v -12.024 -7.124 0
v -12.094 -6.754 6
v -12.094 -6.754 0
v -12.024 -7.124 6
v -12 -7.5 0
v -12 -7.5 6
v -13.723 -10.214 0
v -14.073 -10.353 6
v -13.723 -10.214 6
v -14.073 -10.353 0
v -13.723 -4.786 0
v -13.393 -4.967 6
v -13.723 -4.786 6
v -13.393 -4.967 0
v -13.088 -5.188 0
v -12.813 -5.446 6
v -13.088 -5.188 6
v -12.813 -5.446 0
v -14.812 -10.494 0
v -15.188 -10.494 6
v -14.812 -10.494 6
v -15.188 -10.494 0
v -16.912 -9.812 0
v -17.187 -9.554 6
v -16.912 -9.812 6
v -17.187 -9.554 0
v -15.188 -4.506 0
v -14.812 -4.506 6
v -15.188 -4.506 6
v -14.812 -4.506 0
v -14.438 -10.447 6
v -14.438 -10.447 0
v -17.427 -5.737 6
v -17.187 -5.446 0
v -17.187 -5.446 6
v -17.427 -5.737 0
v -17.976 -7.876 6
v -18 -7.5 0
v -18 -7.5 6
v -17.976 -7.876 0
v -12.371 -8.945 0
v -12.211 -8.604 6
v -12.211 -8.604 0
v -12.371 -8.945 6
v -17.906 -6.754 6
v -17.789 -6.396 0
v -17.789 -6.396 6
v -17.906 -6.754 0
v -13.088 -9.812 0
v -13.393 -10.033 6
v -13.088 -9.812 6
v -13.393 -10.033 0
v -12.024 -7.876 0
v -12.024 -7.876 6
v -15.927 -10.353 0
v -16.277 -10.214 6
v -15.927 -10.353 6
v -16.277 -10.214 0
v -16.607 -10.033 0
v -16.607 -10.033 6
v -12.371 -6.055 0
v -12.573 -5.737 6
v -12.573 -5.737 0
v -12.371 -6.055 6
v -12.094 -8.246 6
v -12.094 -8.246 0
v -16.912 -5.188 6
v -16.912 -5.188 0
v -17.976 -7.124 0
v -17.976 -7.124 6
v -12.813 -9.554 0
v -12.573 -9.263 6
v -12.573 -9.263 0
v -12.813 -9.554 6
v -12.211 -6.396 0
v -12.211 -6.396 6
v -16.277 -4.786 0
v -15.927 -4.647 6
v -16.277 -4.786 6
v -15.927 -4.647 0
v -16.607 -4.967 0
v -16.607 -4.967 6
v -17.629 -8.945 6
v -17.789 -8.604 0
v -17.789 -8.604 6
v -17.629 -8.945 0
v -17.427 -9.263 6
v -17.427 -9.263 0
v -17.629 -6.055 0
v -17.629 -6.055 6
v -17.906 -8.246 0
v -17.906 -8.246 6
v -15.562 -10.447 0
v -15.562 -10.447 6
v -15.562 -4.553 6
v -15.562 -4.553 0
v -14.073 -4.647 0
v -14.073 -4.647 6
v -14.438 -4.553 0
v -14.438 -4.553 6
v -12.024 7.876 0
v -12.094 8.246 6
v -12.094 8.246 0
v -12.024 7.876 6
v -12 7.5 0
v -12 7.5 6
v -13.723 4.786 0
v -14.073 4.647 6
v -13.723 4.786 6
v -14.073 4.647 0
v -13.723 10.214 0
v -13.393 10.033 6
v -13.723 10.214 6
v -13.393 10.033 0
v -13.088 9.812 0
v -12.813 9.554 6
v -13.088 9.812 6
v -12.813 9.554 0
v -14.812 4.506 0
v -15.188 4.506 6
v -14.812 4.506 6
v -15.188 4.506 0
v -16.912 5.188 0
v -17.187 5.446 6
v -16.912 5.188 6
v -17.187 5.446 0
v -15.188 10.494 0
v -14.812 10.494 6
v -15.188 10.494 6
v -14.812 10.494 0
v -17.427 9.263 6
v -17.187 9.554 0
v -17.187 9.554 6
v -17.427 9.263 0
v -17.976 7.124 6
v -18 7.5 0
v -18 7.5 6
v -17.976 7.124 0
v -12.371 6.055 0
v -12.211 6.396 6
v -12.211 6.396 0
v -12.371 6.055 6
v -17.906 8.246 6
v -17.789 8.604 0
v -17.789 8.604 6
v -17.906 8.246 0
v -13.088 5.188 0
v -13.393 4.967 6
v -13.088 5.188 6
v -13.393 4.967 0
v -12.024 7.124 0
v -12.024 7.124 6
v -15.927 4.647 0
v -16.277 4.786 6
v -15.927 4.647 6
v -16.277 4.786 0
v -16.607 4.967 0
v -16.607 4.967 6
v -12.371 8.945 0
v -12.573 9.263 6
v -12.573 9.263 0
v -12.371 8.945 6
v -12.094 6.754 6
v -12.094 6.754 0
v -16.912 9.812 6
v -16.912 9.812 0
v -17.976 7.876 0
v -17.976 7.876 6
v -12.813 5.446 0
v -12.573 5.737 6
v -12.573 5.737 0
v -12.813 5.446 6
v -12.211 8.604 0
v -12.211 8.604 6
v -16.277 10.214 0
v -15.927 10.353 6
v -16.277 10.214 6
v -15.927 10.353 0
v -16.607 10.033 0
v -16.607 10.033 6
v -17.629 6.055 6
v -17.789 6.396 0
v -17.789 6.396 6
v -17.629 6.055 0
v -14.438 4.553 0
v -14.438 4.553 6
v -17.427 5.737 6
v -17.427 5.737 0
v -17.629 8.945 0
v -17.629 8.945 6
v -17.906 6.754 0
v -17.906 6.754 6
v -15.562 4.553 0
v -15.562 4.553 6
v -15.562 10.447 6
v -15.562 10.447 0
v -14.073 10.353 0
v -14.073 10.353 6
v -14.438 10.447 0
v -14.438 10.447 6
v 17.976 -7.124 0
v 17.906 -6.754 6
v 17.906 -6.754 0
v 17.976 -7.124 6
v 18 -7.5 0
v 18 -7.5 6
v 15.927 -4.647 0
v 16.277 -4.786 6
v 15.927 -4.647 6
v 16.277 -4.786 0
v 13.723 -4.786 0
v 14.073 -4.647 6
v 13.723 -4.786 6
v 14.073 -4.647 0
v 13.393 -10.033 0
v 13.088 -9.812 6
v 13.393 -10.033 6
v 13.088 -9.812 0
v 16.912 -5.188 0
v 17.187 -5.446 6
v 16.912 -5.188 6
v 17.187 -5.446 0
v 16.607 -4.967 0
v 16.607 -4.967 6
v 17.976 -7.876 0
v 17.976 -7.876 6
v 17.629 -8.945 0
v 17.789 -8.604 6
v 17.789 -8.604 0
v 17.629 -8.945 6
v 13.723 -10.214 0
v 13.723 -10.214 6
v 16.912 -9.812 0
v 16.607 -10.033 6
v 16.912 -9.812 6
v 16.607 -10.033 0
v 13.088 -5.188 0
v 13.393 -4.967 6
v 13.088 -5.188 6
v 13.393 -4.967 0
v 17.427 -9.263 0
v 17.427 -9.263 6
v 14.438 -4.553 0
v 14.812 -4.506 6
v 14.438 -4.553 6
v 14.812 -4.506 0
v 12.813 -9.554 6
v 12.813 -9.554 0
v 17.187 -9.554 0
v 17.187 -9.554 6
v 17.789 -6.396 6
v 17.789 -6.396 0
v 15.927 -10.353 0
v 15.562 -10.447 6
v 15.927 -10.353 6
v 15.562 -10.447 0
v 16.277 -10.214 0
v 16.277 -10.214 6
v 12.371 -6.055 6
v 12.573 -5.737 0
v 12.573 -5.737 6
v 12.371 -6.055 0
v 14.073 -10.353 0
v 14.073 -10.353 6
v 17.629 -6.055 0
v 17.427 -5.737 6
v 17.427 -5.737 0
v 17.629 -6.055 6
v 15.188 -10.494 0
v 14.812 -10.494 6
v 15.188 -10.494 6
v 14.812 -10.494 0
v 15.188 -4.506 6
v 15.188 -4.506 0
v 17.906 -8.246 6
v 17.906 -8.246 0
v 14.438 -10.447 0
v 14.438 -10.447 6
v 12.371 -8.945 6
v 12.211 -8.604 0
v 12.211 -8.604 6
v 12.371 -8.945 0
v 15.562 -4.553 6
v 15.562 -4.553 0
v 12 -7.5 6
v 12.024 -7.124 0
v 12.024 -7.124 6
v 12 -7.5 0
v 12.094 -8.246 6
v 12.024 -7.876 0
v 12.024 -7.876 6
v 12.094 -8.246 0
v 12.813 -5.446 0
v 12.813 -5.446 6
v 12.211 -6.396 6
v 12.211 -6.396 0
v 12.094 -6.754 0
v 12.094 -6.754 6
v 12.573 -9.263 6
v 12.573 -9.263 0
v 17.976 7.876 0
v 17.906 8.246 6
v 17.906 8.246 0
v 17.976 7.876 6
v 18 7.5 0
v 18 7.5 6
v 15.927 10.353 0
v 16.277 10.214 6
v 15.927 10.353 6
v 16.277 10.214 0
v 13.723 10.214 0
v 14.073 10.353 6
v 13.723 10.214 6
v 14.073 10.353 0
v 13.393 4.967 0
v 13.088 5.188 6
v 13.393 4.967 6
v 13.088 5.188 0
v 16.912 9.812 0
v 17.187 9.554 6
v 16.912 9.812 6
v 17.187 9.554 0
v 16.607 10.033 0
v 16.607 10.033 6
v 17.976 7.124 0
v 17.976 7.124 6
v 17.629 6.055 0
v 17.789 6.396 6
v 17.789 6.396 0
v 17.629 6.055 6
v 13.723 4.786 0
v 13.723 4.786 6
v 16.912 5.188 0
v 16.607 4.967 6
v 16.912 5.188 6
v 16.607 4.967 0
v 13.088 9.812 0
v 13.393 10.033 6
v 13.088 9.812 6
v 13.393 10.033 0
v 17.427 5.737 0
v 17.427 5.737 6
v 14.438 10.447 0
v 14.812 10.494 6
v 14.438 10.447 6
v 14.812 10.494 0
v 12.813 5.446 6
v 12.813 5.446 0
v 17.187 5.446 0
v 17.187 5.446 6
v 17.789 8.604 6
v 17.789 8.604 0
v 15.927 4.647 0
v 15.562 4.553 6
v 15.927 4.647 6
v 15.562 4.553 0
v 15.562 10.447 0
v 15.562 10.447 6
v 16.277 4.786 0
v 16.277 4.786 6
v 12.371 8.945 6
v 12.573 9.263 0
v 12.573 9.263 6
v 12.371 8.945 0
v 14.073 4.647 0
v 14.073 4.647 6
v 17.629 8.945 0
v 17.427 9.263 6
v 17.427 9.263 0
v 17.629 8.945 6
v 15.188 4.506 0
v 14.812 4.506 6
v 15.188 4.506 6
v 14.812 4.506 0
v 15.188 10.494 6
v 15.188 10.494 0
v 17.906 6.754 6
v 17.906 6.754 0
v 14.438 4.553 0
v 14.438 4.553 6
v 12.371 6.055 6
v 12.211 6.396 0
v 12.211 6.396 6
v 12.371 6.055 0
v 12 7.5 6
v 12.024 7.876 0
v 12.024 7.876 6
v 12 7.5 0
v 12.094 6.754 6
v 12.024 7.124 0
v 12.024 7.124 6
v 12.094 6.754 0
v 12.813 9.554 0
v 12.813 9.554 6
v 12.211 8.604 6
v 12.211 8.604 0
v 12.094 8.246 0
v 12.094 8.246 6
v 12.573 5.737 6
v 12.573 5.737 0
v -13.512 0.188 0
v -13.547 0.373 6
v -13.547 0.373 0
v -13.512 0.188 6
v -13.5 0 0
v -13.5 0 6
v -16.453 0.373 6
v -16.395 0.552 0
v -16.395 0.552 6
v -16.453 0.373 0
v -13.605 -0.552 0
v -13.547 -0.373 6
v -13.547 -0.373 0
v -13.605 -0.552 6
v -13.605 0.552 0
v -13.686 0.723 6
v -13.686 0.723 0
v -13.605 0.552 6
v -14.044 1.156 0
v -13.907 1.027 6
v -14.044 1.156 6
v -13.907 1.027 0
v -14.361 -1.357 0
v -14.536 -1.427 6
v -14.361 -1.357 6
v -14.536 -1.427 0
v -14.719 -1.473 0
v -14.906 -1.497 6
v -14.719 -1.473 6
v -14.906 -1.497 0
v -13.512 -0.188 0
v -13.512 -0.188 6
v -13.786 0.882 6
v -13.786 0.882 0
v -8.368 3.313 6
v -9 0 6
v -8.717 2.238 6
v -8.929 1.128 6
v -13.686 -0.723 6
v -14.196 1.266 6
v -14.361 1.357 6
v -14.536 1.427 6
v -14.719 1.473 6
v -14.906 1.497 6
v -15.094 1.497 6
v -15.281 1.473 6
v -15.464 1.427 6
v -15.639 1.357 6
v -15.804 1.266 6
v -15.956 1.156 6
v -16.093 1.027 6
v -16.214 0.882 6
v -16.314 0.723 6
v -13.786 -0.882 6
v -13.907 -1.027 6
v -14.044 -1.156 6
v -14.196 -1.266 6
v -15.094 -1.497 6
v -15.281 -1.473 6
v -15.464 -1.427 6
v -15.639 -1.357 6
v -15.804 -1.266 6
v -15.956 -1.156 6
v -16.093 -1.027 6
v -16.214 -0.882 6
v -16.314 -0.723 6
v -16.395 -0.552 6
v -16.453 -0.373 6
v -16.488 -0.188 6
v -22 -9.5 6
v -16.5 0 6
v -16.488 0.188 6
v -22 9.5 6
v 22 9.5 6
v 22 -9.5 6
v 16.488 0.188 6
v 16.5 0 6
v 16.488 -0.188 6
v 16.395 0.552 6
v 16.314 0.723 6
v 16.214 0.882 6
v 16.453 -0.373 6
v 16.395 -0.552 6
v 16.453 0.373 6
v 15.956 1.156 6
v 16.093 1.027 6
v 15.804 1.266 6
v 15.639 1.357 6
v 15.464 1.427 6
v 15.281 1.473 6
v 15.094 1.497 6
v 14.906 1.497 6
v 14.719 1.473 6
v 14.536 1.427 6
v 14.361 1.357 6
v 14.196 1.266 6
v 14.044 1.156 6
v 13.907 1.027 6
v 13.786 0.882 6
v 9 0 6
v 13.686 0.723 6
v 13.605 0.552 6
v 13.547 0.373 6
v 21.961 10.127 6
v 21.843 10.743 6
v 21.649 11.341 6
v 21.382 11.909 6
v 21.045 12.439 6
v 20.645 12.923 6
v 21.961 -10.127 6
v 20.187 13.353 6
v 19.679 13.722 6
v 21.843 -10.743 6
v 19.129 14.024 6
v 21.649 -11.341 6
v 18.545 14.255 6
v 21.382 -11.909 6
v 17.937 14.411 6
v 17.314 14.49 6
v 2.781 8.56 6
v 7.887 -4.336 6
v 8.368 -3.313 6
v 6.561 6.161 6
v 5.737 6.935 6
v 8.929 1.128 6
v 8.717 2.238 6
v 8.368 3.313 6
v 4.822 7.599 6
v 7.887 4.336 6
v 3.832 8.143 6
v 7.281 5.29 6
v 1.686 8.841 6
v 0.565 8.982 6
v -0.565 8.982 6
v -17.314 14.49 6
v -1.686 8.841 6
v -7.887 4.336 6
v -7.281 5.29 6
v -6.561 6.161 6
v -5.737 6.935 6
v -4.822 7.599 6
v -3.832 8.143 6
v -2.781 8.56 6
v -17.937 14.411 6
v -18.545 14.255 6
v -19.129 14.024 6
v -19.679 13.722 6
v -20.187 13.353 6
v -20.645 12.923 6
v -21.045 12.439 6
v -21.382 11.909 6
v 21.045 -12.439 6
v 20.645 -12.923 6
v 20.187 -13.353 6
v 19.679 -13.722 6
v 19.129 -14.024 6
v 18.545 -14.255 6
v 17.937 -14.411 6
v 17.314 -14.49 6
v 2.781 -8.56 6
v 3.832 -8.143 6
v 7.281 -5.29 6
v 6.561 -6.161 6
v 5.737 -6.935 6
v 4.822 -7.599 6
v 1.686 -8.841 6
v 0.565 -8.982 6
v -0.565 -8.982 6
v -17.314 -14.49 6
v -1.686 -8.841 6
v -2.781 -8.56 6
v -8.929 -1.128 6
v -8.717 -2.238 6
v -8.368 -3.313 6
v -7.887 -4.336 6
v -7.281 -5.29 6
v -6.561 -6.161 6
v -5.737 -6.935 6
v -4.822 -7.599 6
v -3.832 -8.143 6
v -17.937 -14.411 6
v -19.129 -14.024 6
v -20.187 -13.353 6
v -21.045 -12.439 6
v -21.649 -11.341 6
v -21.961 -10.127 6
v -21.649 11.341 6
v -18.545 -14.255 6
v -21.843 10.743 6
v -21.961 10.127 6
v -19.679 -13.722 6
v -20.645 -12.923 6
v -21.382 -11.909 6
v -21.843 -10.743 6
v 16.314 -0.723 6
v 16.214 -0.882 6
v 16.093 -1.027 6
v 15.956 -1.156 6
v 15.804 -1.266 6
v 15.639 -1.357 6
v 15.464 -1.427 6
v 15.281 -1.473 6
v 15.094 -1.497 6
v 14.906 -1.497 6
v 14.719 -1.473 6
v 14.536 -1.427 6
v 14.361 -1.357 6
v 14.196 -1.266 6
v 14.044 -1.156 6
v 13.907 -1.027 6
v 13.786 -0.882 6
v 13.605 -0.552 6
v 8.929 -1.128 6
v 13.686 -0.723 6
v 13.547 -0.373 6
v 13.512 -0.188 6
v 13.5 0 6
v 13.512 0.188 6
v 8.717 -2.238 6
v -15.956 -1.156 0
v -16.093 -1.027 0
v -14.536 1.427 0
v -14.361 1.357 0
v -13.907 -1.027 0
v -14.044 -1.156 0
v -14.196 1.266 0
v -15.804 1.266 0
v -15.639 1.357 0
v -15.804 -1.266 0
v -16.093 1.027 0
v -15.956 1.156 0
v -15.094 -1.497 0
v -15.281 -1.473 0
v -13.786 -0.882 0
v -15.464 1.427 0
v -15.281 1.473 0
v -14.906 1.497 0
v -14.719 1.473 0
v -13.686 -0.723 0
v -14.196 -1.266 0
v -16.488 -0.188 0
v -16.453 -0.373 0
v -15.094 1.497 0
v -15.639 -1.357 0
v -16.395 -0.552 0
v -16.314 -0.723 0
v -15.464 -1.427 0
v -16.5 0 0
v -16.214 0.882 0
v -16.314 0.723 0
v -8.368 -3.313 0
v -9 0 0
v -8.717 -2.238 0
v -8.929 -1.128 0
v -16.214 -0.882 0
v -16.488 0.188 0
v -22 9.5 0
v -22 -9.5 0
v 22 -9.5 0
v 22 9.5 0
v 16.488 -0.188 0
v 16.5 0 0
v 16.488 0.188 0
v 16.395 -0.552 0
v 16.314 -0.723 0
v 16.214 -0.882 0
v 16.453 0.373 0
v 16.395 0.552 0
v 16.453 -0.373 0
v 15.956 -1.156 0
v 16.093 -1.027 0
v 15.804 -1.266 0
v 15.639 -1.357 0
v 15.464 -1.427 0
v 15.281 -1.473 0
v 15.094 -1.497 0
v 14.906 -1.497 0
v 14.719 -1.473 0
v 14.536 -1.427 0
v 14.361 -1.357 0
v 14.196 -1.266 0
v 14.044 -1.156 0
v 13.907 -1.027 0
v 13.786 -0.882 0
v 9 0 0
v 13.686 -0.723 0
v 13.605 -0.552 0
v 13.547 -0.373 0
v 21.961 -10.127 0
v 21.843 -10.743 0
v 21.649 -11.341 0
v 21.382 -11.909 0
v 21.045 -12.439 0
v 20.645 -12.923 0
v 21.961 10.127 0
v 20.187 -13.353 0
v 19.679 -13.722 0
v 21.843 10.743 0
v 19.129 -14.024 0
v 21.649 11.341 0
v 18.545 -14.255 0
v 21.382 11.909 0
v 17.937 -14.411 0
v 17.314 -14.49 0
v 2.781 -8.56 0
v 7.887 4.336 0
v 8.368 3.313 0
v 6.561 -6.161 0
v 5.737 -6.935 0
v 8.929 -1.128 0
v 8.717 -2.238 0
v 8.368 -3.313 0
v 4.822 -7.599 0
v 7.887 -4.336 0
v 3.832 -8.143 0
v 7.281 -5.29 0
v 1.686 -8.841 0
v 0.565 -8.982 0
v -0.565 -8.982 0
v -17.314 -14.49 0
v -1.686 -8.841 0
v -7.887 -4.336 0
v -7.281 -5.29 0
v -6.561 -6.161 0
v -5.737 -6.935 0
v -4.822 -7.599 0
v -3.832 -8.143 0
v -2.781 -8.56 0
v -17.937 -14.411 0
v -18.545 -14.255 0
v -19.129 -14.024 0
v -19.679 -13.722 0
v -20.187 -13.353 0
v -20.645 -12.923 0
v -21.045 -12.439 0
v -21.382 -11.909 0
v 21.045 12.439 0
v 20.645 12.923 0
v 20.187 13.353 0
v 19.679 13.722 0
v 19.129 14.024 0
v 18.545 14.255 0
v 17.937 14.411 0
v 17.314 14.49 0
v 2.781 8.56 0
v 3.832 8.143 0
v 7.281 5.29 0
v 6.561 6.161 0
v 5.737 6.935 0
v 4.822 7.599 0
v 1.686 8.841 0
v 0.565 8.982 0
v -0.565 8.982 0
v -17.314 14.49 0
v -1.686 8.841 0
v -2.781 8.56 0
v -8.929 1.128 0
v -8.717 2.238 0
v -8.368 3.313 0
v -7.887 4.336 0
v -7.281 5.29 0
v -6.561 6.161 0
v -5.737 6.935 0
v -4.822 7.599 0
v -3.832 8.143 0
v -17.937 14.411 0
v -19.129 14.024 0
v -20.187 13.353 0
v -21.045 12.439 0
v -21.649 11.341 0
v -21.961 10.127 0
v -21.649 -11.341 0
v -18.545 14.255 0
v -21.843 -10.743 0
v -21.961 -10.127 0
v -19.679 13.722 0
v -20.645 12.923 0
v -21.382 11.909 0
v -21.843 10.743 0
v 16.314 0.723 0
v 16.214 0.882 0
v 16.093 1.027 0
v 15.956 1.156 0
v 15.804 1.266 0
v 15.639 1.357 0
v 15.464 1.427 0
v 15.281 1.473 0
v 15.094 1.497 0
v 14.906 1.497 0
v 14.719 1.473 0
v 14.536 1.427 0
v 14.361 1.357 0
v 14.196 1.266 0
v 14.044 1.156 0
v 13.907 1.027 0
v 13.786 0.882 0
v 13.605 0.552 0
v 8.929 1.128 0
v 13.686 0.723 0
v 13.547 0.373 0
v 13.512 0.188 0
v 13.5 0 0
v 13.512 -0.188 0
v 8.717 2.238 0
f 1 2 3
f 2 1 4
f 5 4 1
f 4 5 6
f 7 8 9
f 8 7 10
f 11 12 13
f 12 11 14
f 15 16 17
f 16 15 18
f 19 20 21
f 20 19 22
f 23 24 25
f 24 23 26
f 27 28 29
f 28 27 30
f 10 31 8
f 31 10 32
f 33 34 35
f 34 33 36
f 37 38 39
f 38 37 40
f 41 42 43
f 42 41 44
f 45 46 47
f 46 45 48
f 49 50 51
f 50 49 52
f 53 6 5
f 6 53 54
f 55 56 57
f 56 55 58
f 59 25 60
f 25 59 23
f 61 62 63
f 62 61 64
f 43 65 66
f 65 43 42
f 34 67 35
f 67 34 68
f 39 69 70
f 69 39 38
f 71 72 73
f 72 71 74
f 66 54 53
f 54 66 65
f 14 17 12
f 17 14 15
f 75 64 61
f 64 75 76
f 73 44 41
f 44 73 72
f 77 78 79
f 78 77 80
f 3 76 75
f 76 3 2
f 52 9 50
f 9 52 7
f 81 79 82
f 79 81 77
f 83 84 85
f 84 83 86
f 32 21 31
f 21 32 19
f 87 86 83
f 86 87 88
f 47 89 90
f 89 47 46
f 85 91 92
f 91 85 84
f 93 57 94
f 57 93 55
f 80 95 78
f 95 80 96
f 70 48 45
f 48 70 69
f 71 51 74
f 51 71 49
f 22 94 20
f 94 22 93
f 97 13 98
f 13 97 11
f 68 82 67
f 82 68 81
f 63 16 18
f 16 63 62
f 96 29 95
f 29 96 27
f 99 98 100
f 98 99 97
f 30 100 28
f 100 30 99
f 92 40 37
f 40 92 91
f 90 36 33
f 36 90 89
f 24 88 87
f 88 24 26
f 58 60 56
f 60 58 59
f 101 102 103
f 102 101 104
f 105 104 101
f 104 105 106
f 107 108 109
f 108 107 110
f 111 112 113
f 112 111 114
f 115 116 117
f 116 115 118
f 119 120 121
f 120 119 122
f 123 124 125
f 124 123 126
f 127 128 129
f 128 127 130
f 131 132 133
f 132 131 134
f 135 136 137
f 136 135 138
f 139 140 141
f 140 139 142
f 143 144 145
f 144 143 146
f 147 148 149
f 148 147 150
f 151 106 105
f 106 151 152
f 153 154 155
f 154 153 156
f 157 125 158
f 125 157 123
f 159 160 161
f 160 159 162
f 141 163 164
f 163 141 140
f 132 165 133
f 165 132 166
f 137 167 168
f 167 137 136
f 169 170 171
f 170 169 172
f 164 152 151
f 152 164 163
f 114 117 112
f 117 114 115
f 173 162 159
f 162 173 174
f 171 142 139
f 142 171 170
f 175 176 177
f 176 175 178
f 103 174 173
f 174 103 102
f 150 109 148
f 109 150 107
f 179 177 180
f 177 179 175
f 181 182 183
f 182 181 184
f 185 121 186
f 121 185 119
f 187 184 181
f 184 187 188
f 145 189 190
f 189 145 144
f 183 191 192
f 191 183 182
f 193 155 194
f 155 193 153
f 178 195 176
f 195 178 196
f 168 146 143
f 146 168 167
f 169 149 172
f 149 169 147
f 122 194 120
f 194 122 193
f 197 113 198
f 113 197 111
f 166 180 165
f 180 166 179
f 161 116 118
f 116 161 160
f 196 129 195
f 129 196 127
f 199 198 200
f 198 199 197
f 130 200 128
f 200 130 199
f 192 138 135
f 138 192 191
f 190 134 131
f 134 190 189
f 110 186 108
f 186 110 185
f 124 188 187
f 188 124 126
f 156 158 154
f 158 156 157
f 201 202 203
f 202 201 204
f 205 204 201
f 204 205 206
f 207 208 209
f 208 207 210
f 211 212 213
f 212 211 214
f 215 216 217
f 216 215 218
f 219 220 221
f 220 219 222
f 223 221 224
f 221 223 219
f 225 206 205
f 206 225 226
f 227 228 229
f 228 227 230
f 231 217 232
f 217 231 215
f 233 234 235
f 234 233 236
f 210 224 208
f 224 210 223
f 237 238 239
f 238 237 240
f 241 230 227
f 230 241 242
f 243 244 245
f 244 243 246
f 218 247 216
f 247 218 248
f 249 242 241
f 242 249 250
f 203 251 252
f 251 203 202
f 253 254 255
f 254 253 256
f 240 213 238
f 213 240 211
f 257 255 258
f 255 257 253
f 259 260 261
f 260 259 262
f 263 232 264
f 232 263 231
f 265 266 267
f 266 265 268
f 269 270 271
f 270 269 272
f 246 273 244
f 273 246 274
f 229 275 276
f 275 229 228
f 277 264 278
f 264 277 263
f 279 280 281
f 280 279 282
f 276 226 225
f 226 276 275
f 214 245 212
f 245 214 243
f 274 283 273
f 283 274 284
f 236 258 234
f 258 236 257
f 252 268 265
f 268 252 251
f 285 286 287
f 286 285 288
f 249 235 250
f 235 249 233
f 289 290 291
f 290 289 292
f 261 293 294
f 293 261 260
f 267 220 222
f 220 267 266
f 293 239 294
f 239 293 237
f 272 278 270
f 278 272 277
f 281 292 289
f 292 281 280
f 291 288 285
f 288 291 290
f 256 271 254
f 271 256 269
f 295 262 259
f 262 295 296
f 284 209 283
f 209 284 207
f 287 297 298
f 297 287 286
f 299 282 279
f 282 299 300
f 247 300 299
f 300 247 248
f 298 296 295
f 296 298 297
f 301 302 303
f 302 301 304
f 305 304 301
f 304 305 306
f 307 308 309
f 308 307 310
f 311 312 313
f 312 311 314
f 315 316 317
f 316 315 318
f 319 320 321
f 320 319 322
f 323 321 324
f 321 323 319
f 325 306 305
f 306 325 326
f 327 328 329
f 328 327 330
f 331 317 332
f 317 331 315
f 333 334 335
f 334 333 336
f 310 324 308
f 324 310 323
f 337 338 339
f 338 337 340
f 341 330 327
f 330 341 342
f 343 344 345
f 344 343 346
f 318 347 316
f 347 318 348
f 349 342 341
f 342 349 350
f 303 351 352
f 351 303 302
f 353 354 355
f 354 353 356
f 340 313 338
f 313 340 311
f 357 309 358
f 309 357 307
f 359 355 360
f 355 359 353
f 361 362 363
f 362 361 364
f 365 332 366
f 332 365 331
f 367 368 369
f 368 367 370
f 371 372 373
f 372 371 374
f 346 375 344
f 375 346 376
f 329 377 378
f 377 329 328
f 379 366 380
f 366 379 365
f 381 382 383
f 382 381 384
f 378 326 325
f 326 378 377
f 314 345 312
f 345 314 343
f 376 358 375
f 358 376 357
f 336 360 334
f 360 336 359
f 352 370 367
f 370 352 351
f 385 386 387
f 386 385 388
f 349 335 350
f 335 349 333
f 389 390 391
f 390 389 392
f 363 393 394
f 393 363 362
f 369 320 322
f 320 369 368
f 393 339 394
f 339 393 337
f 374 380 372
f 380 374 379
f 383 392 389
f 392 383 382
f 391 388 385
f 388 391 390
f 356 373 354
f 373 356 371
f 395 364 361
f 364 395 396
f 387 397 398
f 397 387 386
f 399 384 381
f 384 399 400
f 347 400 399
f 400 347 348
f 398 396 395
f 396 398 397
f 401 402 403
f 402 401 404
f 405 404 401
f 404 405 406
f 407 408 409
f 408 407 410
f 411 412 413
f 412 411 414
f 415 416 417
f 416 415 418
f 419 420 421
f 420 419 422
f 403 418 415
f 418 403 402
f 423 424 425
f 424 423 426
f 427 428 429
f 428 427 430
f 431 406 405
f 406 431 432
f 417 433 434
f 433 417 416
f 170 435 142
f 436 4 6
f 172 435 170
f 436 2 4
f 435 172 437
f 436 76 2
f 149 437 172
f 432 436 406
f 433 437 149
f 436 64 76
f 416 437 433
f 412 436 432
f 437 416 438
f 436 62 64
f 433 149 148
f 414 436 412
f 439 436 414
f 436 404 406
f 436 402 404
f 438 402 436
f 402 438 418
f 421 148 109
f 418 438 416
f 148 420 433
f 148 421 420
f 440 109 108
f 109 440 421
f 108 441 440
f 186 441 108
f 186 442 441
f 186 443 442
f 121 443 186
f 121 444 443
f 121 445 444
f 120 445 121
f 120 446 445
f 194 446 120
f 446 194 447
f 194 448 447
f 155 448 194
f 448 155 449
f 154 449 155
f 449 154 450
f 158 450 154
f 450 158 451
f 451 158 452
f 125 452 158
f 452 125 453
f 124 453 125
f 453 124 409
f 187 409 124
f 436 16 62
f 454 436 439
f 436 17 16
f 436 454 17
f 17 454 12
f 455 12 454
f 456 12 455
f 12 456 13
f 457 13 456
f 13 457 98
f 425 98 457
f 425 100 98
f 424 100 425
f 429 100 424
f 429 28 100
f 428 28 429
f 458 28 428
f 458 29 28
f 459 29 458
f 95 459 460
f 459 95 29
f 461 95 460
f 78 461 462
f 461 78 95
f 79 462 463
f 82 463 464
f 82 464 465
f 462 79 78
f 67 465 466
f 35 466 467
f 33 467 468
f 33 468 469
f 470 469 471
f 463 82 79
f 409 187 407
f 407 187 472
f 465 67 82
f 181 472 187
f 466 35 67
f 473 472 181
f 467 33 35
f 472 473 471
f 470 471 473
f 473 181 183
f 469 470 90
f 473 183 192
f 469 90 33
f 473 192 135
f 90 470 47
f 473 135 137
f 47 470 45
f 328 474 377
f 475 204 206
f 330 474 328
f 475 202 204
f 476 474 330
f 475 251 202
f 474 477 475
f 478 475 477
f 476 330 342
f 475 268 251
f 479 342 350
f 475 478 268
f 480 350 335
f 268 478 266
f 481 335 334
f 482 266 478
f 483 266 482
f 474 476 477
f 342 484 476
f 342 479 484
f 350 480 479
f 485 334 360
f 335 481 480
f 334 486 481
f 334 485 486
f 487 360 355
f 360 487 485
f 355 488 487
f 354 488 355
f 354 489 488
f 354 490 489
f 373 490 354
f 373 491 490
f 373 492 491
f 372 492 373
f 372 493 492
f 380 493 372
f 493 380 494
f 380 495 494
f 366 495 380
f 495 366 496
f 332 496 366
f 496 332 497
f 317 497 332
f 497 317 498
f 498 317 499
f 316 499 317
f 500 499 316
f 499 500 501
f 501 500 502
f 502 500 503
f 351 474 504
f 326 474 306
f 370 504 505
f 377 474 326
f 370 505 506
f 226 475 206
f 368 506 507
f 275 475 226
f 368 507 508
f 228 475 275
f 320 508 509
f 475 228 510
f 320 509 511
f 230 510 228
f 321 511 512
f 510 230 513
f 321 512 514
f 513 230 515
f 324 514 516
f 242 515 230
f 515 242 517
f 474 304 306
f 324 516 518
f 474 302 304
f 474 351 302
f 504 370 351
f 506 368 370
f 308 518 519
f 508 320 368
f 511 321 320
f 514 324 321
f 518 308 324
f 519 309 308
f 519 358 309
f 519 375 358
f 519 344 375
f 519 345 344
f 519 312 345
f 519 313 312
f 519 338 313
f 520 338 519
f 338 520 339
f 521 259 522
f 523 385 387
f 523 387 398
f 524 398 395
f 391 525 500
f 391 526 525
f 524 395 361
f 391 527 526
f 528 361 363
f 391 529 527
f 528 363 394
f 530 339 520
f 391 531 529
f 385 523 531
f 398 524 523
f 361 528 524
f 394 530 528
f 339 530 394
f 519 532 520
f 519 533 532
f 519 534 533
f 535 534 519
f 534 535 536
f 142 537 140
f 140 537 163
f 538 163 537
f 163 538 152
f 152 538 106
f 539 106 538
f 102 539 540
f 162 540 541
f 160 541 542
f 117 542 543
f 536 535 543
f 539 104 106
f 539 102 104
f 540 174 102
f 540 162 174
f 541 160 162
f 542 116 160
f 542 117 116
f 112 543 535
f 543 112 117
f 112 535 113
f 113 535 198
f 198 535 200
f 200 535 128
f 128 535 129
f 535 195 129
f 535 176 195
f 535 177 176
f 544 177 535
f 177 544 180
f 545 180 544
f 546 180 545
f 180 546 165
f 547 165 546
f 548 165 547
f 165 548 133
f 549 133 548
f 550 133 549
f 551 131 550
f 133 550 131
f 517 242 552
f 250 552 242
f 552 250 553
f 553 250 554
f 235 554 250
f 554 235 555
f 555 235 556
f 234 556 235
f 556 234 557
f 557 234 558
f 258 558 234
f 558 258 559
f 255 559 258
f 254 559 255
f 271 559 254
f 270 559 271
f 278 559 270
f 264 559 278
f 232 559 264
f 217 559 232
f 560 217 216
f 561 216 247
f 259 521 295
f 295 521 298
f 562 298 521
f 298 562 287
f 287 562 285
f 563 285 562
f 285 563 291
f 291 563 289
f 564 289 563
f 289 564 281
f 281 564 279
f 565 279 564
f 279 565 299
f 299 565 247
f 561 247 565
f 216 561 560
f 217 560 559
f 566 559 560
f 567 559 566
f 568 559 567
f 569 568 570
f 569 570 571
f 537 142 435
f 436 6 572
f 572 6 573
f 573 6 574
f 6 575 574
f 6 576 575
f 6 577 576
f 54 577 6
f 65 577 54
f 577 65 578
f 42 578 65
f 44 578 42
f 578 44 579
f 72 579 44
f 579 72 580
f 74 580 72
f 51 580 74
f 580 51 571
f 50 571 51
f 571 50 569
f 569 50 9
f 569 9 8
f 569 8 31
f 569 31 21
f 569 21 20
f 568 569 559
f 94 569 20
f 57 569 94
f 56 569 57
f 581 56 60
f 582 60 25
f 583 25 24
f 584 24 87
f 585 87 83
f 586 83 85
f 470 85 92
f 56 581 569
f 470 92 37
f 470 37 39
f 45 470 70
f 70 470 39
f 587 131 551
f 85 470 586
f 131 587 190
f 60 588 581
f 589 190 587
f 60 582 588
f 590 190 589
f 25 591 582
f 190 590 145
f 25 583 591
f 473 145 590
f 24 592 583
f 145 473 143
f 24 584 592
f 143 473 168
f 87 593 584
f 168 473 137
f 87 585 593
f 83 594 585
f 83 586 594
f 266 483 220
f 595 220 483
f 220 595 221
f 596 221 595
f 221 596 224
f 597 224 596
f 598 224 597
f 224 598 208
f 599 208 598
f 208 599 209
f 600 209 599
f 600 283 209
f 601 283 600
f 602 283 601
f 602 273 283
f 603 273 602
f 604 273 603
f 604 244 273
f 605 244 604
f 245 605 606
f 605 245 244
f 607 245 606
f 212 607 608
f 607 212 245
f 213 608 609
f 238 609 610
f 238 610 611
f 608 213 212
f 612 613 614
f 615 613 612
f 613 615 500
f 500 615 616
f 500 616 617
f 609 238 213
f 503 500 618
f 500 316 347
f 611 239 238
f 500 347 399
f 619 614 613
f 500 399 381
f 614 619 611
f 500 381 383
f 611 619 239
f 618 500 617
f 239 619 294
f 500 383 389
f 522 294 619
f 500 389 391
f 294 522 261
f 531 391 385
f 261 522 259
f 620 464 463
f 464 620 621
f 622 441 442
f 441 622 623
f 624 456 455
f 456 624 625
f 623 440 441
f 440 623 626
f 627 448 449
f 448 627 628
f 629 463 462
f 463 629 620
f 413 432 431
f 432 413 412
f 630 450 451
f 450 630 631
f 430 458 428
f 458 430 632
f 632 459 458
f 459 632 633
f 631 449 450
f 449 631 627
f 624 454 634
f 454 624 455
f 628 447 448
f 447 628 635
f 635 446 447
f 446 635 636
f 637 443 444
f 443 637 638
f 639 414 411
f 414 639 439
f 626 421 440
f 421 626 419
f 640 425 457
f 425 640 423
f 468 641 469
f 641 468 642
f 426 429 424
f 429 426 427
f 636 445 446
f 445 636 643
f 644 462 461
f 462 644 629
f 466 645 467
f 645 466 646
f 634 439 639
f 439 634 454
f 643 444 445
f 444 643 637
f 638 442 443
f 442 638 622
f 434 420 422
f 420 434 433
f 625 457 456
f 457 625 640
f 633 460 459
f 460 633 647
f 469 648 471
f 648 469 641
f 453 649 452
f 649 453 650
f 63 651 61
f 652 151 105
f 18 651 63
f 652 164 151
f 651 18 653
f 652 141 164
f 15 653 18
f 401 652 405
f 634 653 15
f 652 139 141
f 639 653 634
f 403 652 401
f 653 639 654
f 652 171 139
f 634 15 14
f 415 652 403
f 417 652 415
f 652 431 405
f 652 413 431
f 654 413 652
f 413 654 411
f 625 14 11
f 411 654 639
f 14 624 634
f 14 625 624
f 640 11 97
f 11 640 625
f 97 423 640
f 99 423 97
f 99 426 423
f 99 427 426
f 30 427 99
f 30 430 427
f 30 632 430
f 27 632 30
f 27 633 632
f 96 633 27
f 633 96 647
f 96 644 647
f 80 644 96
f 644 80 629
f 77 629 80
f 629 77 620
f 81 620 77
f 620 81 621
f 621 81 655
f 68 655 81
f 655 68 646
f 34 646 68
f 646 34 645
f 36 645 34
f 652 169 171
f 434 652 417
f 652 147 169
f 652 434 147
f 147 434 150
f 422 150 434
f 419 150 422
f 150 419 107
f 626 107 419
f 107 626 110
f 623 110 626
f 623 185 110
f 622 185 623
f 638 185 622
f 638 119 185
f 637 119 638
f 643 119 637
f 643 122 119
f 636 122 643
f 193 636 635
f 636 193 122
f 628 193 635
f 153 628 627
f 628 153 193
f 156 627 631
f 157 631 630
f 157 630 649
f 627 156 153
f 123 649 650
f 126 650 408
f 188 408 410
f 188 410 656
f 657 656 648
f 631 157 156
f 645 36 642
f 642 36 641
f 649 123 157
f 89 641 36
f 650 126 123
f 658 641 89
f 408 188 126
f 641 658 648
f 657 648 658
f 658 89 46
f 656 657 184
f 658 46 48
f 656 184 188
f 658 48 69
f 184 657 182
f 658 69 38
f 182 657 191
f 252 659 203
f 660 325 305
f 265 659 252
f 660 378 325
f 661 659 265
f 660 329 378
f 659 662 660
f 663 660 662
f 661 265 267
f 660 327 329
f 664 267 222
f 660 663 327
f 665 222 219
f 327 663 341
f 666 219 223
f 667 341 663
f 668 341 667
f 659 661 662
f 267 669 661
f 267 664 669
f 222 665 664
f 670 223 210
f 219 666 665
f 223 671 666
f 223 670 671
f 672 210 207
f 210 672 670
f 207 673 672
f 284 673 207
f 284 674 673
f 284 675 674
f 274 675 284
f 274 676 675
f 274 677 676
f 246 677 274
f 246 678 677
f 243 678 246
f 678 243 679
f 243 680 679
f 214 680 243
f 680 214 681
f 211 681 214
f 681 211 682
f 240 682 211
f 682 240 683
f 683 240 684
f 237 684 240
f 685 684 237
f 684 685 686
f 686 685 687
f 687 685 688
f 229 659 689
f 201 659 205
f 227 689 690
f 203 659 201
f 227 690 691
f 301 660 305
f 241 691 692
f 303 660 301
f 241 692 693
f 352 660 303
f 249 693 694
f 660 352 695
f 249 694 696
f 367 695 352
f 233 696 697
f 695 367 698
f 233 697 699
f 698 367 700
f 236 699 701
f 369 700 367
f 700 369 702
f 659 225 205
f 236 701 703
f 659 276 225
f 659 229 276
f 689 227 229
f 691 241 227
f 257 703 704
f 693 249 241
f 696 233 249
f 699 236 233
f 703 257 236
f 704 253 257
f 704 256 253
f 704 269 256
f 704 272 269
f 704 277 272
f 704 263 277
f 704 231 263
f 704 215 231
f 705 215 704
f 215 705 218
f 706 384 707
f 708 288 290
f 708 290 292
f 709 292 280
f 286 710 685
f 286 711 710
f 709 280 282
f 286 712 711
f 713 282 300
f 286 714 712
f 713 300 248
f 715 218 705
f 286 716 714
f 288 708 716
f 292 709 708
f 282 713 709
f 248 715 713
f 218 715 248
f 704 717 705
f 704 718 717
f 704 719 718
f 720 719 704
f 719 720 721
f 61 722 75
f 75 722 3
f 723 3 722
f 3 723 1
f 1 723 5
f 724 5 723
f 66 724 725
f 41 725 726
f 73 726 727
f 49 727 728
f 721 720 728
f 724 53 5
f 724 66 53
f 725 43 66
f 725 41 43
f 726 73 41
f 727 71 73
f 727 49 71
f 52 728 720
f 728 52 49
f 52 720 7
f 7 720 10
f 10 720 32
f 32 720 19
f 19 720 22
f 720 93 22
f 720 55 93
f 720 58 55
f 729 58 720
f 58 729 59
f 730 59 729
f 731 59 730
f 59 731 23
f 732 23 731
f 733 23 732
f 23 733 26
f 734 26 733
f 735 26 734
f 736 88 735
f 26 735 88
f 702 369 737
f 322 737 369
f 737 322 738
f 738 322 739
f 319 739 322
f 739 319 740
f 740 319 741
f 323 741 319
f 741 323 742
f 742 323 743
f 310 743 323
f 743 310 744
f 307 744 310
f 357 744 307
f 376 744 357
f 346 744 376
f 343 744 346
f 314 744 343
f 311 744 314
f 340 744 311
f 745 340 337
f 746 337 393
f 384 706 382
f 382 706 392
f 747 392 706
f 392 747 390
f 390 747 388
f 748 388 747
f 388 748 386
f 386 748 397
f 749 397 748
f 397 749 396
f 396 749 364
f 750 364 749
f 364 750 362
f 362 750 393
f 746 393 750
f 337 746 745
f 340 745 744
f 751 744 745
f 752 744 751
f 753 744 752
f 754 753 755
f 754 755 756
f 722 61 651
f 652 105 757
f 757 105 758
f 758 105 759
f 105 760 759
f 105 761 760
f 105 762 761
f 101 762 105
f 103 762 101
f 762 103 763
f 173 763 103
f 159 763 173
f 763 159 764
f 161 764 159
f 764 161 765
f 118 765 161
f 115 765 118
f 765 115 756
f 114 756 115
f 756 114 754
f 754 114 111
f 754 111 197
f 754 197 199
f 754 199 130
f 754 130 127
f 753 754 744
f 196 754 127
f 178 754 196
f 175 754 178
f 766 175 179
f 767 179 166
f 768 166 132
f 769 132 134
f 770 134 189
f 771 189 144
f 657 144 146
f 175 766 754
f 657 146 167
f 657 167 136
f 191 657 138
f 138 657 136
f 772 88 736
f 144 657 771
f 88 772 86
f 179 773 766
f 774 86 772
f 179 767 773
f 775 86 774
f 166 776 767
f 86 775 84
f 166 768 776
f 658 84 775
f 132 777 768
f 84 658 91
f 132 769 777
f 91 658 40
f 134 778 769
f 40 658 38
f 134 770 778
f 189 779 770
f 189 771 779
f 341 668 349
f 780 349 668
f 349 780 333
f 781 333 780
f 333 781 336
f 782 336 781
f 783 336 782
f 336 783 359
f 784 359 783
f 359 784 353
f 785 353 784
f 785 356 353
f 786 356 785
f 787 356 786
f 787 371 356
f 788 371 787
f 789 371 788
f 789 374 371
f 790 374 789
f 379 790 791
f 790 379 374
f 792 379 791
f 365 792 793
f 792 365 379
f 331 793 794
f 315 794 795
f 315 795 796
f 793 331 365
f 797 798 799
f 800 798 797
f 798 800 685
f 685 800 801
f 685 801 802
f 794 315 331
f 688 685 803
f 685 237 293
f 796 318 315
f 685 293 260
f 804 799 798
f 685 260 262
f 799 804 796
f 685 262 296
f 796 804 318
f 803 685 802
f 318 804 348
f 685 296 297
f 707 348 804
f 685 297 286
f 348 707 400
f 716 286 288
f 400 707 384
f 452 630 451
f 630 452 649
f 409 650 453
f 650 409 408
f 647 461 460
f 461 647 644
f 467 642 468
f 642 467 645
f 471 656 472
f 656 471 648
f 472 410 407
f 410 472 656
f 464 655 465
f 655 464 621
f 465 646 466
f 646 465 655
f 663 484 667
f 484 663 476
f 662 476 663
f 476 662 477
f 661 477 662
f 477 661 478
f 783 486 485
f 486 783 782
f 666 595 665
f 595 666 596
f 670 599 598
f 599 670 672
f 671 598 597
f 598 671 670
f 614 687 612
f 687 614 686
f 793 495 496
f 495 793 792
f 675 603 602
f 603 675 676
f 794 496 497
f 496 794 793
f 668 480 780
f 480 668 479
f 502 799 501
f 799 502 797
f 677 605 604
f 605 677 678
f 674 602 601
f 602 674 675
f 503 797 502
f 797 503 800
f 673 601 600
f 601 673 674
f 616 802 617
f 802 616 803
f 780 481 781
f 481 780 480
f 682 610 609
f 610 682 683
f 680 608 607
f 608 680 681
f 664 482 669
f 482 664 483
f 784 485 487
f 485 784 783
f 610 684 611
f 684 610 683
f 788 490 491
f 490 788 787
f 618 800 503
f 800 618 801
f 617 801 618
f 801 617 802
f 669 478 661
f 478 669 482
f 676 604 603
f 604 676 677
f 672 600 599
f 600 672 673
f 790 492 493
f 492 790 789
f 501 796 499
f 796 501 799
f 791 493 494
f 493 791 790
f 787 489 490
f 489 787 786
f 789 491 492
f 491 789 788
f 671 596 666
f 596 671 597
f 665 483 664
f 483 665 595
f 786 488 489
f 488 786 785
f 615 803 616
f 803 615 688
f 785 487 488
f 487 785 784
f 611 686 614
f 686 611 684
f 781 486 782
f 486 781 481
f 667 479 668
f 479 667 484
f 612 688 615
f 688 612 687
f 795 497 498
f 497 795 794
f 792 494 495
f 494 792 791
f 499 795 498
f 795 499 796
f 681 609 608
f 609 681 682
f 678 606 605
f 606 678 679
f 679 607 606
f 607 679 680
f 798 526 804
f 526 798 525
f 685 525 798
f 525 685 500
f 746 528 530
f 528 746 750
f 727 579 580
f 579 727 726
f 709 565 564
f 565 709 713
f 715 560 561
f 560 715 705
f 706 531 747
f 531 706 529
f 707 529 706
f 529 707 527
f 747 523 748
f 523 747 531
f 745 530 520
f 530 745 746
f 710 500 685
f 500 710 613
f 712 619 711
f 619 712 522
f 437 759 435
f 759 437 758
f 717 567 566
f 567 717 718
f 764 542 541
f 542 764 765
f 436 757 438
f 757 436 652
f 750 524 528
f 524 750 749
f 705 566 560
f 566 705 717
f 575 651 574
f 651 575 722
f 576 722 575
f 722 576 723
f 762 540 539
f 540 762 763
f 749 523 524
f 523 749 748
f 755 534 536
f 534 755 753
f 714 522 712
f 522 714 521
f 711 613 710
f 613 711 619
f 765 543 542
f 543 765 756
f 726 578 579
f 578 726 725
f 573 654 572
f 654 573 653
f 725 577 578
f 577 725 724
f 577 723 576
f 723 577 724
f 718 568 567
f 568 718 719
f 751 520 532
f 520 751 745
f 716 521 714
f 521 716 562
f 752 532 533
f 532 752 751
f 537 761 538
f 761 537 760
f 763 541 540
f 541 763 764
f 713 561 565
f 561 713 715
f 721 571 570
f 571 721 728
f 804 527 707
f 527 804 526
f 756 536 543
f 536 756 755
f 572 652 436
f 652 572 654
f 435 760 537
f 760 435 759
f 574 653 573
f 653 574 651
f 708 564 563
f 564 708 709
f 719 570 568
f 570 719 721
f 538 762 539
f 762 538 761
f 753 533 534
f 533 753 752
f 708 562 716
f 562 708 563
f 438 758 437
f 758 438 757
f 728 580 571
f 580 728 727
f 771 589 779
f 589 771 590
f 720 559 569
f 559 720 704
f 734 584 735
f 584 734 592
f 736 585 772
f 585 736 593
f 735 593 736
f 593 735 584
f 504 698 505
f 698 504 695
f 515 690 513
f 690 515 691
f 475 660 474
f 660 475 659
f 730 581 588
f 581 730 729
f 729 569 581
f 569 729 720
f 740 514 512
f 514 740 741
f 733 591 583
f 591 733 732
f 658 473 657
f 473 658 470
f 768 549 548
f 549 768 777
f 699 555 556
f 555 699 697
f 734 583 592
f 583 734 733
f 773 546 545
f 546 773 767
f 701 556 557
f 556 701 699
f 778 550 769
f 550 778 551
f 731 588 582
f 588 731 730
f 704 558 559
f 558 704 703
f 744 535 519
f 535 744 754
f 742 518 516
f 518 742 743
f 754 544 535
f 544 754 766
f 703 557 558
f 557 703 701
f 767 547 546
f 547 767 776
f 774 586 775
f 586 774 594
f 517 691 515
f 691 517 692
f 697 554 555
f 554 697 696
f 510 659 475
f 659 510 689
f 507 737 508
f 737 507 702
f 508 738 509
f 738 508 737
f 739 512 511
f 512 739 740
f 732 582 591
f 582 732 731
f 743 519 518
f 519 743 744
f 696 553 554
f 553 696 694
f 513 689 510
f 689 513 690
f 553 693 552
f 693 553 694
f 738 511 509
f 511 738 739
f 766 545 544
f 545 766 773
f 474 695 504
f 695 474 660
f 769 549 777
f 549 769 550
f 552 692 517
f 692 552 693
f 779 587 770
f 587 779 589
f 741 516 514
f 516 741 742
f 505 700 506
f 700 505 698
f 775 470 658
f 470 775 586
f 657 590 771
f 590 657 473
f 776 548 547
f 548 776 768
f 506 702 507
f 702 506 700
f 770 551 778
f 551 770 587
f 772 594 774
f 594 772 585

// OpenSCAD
$fn = 50;


difference() {
	union() {
		hull() {
			translate(v = [-17.0000000000, 9.5000000000, 0]) {
				cylinder(h = 6, r = 5);
			}
			translate(v = [17.0000000000, 9.5000000000, 0]) {
				cylinder(h = 6, r = 5);
			}
			translate(v = [-17.0000000000, -9.5000000000, 0]) {
				cylinder(h = 6, r = 5);
			}
			translate(v = [17.0000000000, -9.5000000000, 0]) {
				cylinder(h = 6, r = 5);
			}
		}
	}
	union() {
		#translate(v = [-15.0000000000, -7.5000000000, 0]) {
			cylinder(h = 6, r = 3.0000000000);
		}
		#translate(v = [-15.0000000000, 7.5000000000, 0]) {
			cylinder(h = 6, r = 3.0000000000);
		}
		#translate(v = [15.0000000000, -7.5000000000, 0]) {
			cylinder(h = 6, r = 3.0000000000);
		}
		#translate(v = [15.0000000000, 7.5000000000, 0]) {
			cylinder(h = 6, r = 3.0000000000);
		}
		#translate(v = [-15.0000000000, -7.5000000000, -100.0000000000]) {
			cylinder(h = 200, r = 3.0000000000);
		}
		#translate(v = [-15.0000000000, 7.5000000000, -100.0000000000]) {
			cylinder(h = 200, r = 3.0000000000);
		}
		#translate(v = [15.0000000000, -7.5000000000, -100.0000000000]) {
			cylinder(h = 200, r = 3.0000000000);
		}
		#translate(v = [15.0000000000, 7.5000000000, -100.0000000000]) {
			cylinder(h = 200, r = 3.0000000000);
		}
		#translate(v = [-15.0000000000, -7.5000000000, 0]) {
			cylinder(h = 6, r = 1.5000000000);
		}
		#translate(v = [-15.0000000000, 0.0000000000, 0]) {
			cylinder(h = 6, r = 1.5000000000);
		}
		#translate(v = [-15.0000000000, 7.5000000000, 0]) {
			cylinder(h = 6, r = 1.5000000000);
		}
		#translate(v = [15.0000000000, -7.5000000000, 0]) {
			cylinder(h = 6, r = 1.5000000000);
		}
		#translate(v = [15.0000000000, 0.0000000000, 0]) {
			cylinder(h = 6, r = 1.5000000000);
		}
		#translate(v = [15.0000000000, 7.5000000000, 0]) {
			cylinder(h = 6, r = 1.5000000000);
		}
		#translate(v = [-15.0000000000, -7.5000000000, 0]) {
			cylinder(h = 6, r = 1.5000000000);
		}
		#translate(v = [-15.0000000000, 0.0000000000, 0]) {
			cylinder(h = 6, r = 1.5000000000);
		}
		#translate(v = [-15.0000000000, 7.5000000000, 0]) {
			cylinder(h = 6, r = 1.5000000000);
		}
		#translate(v = [15.0000000000, -7.5000000000, 0]) {
			cylinder(h = 6, r = 1.5000000000);
		}
		#translate(v = [15.0000000000, 0.0000000000, 0]) {
			cylinder(h = 6, r = 1.5000000000);
		}
		#translate(v = [15.0000000000, 7.5000000000, 0]) {
			cylinder(h = 6, r = 1.5000000000);
		}
		#translate(v = [-15.0000000000, -7.5000000000, 0]) {
			cylinder(h = 6, r = 1.5000000000);
		}
		#translate(v = [-15.0000000000, 0.0000000000, 0]) {
			cylinder(h = 6, r = 1.5000000000);
		}
		#translate(v = [-15.0000000000, 7.5000000000, 0]) {
			cylinder(h = 6, r = 1.5000000000);
		}
		#translate(v = [15.0000000000, -7.5000000000, 0]) {
			cylinder(h = 6, r = 1.5000000000);
		}
		#translate(v = [15.0000000000, 0.0000000000, 0]) {
			cylinder(h = 6, r = 1.5000000000);
		}
		#translate(v = [15.0000000000, 7.5000000000, 0]) {
			cylinder(h = 6, r = 1.5000000000);
		}
		#cylinder(h = 6, r = 9.0000000000);
	}
}
